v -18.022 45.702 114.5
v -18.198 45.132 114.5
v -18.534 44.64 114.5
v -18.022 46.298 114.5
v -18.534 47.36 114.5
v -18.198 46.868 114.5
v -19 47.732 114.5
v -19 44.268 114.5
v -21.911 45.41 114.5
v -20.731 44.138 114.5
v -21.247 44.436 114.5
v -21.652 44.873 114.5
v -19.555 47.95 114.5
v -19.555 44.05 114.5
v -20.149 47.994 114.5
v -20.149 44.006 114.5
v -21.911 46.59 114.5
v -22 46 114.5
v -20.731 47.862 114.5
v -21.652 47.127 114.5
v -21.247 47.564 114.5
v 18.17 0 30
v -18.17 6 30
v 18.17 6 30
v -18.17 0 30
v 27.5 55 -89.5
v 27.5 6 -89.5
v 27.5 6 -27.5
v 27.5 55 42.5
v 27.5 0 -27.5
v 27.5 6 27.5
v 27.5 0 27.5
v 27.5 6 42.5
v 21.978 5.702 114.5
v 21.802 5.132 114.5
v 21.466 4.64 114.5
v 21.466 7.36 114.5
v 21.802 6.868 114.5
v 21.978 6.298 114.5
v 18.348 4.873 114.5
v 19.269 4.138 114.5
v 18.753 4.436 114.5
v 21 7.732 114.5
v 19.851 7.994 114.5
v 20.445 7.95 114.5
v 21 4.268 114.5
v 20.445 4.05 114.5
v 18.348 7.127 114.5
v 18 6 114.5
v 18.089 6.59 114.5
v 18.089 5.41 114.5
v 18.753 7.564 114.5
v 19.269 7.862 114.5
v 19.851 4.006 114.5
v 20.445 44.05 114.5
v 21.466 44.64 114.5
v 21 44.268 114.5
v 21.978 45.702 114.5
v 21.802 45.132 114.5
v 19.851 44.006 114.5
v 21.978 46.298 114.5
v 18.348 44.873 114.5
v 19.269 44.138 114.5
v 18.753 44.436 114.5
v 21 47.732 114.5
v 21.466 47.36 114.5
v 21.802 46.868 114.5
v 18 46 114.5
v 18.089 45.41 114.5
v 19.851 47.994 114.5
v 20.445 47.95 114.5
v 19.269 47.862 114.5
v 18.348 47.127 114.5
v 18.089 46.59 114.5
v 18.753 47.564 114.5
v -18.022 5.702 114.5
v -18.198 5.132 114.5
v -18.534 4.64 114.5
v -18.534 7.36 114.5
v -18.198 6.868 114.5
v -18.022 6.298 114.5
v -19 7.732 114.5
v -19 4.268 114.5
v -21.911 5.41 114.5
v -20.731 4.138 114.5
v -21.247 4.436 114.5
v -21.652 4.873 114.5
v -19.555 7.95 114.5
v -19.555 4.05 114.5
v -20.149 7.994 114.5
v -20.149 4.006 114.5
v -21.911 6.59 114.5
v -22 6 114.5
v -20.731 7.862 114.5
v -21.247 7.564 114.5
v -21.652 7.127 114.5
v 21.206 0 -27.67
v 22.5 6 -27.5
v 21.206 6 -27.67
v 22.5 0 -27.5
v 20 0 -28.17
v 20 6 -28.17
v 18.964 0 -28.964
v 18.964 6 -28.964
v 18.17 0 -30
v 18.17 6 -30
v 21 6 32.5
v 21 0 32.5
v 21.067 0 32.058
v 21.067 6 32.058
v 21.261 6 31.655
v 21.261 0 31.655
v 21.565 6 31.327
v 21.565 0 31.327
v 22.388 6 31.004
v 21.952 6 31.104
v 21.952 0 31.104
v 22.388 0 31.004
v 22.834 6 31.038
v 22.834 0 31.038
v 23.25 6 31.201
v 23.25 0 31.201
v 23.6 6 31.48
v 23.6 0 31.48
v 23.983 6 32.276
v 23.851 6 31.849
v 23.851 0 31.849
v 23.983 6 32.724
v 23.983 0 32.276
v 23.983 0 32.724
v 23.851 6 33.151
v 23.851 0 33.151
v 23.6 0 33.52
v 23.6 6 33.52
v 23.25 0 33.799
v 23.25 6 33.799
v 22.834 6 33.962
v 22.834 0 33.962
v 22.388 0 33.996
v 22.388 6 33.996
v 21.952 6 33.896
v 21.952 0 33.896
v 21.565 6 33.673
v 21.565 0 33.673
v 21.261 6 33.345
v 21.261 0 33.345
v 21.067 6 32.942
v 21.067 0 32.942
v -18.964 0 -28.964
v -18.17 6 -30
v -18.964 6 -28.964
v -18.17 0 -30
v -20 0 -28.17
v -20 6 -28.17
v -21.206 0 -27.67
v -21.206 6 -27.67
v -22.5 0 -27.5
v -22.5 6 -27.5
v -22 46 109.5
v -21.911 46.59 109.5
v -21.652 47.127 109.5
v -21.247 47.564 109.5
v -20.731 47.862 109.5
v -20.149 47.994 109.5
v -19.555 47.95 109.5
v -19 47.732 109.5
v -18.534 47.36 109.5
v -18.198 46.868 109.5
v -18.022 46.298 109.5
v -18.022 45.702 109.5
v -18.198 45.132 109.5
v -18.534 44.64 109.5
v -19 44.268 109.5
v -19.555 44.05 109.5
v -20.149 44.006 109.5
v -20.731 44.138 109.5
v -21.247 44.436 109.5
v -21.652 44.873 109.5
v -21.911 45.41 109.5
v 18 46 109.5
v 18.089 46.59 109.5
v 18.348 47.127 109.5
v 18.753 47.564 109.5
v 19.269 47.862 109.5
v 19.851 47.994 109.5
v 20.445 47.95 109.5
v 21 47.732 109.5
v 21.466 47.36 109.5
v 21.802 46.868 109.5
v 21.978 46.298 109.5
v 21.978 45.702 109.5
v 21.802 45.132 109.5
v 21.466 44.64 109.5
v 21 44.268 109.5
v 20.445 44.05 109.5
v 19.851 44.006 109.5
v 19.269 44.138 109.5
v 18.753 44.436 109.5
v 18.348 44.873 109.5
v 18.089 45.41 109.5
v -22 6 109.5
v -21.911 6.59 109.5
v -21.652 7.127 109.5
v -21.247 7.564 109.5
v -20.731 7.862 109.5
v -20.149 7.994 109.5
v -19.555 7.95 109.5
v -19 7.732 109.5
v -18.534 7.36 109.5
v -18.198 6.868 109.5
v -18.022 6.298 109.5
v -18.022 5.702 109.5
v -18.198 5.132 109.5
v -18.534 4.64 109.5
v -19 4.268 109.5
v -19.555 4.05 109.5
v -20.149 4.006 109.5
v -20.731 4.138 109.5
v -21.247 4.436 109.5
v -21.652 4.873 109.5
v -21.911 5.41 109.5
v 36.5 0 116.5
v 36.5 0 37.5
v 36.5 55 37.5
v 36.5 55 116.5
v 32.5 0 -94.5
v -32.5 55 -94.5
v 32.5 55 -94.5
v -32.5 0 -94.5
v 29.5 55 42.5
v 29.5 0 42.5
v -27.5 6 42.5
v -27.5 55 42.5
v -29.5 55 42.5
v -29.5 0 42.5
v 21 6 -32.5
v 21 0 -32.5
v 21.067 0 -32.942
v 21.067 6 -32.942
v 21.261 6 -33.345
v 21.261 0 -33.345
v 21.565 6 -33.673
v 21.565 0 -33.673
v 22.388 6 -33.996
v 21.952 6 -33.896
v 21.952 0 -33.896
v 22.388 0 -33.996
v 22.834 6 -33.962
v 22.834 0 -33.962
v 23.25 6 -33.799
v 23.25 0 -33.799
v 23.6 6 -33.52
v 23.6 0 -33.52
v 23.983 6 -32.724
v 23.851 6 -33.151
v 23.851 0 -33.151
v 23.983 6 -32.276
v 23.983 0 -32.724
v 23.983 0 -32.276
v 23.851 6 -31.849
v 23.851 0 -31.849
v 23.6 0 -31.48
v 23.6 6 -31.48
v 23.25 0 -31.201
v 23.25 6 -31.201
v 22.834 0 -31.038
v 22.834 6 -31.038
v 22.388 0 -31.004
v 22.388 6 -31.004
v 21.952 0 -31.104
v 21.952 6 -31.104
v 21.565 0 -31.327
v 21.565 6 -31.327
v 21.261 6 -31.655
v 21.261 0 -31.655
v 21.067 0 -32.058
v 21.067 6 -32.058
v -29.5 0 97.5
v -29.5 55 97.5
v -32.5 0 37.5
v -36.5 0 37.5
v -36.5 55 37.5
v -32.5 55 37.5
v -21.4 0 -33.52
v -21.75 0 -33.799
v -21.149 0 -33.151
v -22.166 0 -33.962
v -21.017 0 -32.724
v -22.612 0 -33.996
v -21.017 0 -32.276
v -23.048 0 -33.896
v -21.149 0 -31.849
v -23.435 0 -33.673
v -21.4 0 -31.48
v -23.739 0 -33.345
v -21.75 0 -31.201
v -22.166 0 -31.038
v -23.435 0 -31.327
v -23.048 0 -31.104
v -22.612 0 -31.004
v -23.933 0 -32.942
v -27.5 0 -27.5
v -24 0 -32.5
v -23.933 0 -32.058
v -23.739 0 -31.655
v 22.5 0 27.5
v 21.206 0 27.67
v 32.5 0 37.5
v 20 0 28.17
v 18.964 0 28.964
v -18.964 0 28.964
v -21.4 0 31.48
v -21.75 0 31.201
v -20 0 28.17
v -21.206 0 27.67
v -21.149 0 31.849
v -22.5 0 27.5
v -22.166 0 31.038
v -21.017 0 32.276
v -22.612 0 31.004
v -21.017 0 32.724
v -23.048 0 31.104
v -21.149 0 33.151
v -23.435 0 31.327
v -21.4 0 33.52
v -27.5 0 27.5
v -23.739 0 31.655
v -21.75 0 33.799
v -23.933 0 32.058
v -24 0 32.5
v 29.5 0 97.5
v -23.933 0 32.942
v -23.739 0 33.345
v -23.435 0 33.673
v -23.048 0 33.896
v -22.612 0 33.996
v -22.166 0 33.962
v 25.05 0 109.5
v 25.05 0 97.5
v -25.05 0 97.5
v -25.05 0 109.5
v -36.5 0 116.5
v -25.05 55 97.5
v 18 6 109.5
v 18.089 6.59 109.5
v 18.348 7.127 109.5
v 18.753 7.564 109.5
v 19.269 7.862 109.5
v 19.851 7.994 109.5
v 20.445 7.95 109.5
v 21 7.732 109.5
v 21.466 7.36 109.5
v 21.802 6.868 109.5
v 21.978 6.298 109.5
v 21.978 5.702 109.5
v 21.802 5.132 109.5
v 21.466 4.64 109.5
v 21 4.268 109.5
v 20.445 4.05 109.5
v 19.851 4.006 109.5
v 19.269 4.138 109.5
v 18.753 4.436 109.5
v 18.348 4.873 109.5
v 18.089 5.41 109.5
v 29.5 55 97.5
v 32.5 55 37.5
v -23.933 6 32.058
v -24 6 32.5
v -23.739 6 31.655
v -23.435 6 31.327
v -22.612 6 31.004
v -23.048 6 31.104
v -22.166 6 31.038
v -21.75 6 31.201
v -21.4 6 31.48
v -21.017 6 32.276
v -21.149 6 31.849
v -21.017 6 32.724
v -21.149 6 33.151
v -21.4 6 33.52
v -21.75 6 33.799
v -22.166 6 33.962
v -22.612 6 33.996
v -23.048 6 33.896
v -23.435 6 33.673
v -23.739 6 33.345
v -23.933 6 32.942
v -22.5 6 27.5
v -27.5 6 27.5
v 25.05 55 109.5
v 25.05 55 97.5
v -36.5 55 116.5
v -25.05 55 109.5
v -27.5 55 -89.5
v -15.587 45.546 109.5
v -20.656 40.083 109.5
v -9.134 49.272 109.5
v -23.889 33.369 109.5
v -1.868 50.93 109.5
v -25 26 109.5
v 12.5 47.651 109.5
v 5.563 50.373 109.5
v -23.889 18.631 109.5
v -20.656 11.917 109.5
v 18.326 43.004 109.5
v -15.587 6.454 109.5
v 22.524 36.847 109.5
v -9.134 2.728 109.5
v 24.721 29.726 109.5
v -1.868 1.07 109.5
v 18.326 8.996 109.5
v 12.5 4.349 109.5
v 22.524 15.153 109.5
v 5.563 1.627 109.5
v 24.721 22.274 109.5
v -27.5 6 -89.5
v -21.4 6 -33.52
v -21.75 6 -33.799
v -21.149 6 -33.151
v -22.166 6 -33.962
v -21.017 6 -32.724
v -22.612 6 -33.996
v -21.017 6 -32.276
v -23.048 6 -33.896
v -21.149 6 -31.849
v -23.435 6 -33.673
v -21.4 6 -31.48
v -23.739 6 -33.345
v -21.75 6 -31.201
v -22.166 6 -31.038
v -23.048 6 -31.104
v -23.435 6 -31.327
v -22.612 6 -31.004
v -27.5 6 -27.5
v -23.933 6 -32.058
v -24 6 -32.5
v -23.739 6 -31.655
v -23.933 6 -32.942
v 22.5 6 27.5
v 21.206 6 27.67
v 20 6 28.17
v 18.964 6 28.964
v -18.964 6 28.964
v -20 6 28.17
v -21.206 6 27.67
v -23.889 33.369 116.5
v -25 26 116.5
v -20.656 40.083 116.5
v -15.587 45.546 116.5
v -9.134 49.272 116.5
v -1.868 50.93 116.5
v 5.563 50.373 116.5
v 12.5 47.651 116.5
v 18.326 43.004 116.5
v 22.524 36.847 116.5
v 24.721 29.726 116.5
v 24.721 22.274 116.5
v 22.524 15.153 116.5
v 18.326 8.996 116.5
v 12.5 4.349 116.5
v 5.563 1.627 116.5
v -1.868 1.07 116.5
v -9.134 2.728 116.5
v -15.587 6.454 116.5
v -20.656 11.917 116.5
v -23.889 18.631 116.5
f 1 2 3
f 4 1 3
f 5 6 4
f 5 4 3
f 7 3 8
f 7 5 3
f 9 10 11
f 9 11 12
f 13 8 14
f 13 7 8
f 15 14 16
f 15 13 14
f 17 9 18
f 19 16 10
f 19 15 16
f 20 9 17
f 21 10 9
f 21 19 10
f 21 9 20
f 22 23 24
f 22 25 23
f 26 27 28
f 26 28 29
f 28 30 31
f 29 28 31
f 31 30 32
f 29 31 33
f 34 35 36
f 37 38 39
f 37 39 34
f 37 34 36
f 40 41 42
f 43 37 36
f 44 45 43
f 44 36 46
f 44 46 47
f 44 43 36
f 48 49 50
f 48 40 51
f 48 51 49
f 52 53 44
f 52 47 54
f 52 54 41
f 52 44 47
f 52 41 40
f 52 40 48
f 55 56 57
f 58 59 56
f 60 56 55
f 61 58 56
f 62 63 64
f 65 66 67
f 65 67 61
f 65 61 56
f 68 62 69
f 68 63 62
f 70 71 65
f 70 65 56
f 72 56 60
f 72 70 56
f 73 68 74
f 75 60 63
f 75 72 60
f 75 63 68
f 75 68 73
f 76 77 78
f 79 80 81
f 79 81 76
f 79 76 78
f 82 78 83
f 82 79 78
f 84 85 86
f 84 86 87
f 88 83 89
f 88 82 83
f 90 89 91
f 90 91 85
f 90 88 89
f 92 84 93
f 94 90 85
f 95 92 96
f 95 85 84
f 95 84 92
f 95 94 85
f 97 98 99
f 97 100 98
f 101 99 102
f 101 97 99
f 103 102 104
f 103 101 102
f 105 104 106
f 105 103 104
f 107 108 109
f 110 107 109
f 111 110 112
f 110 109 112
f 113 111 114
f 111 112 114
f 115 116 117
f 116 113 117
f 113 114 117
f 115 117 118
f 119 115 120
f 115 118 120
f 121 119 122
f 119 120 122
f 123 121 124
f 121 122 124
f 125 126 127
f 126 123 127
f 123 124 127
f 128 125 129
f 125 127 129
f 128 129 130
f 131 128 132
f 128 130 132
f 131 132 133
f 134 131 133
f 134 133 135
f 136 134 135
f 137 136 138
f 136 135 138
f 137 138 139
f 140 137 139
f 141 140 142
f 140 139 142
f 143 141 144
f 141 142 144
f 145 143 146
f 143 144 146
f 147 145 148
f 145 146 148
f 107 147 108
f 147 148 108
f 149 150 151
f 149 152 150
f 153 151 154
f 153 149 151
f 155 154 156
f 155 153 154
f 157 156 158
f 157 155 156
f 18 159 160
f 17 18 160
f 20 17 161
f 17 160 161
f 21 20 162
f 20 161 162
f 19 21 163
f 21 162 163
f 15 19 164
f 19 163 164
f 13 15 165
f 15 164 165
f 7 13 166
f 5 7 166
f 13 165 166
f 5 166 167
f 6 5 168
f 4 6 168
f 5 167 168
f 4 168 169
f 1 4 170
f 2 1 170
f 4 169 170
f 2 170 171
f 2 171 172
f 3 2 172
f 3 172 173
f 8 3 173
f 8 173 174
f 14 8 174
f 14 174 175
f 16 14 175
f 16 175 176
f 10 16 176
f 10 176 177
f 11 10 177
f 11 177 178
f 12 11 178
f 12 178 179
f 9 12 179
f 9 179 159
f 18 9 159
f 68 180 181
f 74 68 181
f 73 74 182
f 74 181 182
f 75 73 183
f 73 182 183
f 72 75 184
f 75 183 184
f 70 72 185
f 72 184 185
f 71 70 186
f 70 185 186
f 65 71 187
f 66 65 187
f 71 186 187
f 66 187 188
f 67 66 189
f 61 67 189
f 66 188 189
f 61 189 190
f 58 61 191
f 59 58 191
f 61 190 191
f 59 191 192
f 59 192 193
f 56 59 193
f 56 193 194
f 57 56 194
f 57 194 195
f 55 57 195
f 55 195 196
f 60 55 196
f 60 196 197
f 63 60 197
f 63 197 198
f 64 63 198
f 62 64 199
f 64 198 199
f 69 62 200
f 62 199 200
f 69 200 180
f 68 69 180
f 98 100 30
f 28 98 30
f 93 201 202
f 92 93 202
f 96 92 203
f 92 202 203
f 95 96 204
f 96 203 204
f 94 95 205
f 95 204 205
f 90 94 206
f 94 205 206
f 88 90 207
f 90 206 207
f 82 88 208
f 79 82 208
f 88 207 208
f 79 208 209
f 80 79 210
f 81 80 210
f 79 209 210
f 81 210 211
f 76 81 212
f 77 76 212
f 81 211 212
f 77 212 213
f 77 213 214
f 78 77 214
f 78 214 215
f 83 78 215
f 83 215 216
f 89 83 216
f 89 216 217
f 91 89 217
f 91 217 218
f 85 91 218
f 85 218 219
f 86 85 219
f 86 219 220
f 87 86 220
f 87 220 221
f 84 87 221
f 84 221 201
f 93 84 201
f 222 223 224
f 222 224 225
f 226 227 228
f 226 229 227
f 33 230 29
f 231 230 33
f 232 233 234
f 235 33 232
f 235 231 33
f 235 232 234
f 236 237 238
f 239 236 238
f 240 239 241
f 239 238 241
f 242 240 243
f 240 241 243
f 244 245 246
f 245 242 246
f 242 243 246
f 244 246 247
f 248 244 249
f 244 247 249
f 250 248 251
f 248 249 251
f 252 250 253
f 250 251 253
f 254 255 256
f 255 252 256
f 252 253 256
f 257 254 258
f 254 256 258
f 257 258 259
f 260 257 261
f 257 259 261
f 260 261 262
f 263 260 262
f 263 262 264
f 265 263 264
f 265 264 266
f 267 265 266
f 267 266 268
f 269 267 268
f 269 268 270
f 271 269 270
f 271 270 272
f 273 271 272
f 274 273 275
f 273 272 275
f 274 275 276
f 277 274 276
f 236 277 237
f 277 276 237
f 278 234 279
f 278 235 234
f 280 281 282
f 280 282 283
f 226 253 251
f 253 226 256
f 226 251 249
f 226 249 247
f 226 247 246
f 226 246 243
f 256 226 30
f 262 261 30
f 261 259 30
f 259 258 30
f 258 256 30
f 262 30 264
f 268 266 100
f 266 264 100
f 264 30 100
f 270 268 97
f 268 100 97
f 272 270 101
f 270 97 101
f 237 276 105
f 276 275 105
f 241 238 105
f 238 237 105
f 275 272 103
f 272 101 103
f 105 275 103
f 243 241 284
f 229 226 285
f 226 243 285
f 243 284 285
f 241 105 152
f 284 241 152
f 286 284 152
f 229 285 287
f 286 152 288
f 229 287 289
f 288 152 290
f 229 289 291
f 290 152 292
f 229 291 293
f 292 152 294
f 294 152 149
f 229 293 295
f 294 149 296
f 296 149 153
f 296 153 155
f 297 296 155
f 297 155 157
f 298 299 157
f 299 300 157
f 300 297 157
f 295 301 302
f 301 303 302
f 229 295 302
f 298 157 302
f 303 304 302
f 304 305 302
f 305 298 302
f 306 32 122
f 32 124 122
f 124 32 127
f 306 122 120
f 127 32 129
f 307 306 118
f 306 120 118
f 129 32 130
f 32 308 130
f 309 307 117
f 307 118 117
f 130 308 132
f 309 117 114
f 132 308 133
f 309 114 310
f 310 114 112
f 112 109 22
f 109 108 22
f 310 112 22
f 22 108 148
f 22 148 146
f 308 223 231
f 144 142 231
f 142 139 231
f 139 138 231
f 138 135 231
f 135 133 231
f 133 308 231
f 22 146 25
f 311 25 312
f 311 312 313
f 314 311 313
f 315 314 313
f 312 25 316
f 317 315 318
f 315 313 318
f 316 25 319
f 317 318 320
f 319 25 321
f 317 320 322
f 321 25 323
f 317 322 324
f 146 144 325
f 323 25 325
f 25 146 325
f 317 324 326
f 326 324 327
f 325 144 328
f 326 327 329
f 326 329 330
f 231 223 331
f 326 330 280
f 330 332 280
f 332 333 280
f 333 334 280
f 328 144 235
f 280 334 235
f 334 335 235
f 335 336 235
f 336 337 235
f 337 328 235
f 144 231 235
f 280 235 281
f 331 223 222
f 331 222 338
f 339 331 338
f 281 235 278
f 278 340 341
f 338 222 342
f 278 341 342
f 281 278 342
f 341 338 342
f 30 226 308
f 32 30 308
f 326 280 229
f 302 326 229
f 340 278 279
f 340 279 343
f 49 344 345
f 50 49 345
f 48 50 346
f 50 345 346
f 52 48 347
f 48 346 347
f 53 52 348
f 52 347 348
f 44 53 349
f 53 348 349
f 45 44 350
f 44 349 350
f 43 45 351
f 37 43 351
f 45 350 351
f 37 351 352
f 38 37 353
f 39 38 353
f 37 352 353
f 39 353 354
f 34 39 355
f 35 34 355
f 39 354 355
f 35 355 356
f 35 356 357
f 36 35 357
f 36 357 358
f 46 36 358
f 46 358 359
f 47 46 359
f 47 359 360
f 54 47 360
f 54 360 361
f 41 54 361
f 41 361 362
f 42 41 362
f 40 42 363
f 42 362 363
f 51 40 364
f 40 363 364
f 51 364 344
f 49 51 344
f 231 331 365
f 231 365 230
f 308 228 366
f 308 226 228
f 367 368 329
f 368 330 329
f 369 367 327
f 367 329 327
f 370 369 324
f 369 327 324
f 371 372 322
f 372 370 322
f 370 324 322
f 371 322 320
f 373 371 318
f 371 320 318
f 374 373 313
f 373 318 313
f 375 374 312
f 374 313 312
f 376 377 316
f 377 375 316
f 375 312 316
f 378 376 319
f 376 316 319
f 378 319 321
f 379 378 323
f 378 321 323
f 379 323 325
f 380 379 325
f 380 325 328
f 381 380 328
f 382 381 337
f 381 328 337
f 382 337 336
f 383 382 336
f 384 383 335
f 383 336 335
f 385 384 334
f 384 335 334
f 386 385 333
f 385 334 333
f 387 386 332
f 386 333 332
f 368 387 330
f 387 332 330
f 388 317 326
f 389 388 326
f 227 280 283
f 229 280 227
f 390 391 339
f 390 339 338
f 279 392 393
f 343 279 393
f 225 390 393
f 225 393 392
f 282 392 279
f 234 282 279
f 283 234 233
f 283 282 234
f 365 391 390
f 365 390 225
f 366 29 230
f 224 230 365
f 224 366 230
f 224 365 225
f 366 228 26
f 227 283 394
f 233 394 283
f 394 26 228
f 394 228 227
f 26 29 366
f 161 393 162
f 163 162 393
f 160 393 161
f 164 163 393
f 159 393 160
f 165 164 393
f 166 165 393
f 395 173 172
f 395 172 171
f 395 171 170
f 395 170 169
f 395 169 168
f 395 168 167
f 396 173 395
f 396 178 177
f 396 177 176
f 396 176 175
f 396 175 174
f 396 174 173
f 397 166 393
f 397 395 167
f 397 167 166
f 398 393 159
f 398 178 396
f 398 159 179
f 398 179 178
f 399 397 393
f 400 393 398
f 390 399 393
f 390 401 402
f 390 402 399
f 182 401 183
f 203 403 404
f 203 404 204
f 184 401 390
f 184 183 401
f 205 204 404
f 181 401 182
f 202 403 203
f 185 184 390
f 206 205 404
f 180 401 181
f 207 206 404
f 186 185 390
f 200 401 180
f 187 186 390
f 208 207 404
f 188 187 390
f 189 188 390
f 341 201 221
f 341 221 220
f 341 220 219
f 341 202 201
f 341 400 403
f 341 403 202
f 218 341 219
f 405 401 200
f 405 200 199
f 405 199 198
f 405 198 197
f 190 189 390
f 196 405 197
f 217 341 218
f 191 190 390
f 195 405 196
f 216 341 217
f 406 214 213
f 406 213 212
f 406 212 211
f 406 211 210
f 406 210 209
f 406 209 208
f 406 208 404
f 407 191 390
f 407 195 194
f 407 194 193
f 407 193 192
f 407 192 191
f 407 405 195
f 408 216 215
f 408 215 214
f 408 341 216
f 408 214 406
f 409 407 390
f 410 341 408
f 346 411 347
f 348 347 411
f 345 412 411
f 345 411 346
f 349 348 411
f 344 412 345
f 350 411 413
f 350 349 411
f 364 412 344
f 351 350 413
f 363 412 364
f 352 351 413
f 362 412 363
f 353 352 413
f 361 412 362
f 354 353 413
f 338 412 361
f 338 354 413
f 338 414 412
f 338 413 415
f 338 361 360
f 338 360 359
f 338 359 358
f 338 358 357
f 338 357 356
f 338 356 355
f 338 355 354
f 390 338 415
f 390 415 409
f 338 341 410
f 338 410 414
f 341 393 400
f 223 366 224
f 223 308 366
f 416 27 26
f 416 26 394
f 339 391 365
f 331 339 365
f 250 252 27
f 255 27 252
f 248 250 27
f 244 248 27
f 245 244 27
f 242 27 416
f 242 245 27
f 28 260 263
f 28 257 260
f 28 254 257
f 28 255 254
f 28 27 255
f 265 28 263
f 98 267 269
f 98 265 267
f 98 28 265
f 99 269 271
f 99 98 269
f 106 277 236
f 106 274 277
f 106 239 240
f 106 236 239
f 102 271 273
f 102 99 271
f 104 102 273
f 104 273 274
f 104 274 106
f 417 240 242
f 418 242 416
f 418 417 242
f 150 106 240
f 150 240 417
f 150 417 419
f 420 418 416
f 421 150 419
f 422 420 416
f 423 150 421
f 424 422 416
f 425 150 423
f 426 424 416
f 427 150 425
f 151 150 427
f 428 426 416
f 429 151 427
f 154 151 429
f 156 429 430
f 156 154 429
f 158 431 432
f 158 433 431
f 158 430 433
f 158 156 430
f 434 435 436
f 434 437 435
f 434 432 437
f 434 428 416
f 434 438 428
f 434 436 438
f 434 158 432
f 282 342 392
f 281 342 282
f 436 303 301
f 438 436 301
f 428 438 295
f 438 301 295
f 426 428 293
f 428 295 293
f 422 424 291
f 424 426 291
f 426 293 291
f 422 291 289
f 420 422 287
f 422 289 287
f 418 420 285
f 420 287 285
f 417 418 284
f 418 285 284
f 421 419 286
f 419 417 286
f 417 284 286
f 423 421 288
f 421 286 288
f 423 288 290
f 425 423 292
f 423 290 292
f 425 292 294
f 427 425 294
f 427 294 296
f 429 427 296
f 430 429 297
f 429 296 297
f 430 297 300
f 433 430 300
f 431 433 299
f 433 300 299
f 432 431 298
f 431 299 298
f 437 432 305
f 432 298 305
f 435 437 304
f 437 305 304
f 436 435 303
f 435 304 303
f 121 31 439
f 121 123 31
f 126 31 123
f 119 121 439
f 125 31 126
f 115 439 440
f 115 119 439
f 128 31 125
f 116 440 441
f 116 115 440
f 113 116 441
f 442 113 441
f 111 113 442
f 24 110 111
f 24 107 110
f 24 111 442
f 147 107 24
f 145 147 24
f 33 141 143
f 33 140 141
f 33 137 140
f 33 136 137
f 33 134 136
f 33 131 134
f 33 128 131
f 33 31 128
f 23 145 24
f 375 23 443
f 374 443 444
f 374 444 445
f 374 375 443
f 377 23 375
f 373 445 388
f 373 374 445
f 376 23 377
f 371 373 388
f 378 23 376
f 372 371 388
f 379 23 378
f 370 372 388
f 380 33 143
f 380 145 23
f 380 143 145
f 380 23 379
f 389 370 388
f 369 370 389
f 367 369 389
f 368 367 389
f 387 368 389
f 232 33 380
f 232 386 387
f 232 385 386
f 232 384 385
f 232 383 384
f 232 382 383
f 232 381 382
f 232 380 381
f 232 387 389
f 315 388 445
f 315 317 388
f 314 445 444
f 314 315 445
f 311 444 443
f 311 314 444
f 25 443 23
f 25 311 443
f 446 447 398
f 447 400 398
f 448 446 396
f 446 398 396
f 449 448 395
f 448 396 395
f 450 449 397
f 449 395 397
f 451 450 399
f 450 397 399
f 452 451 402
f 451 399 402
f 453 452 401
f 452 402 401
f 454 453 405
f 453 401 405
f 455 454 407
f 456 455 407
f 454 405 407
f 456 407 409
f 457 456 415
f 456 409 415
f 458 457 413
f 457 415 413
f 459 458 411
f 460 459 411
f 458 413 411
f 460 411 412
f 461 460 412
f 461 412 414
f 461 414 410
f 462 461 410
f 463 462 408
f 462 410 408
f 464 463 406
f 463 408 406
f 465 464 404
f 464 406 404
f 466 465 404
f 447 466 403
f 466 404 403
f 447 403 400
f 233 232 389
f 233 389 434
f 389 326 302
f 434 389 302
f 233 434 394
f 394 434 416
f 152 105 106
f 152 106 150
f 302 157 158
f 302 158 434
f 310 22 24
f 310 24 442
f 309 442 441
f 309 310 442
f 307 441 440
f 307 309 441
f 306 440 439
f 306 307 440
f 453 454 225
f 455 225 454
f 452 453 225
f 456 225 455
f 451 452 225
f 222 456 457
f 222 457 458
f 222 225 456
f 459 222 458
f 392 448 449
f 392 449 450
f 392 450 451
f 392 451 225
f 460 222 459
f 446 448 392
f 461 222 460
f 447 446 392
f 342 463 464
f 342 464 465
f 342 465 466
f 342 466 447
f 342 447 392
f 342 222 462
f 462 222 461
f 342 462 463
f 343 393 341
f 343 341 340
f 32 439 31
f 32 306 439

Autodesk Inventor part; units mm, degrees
ref_plane "YZ Plane" through (0, 0, 0) normal (1, 0, 0) x (0, 1, 0)
ref_plane "XZ Plane" through (0, 0, 0) normal (0, 1, 0) x (-1, 0, 0)
ref_plane "XY Plane" through (0, 0, 0) normal (0, 0, 1) x (1, 0, 0)
sketch "Sketch1" plane through (0, 0, 0) normal (0, 1, 0) x (-1, 0, 0)
  line L0 (-22.5, 32.5) -> (22.5, 32.5) construction
  line L1 (22.5, 32.5) -> (22.5, -32.5) construction
  line L2 (22.5, -32.5) -> (-22.5, -32.5) construction
  line L3 (-22.5, -32.5) -> (-22.5, 32.5) construction
  line L4 (-22.5, 32.5) -> (22.5, -32.5) construction
  line L5 (22.5, 32.5) -> (-22.5, -32.5) construction
  circle A0 centre (22.5, 32.5) radius 1.5
  circle A1 centre (22.5, -32.5) radius 1.5
  circle A2 centre (-22.5, -32.5) radius 1.5
  circle A3 centre (-22.5, 32.5) radius 1.5
  line L6 (27.5, 30) -> (-27.5, 30)
  line L7 (-27.5, 30) -> (-27.5, 37.5)
  line L8 (-27.5, 37.5) -> (27.5, 37.5)
  line L9 (27.5, 37.5) -> (27.5, 30)
  line L10 (27.5, -30) -> (27.5, -37.5)
  line L11 (27.5, -37.5) -> (-27.5, -37.5)
  line L12 (-27.5, -37.5) -> (-27.5, -30)
  line L13 (-27.5, -30) -> (27.5, -30)
  circle A4 centre (22.5, 32.5) radius 5
  circle A5 centre (22.5, -32.5) radius 5
  circle A6 centre (-22.5, -32.5) radius 5
  circle A7 centre (-22.5, 32.5) radius 5
  line L14 (-27.5, 37.5) -> (27.5, 37.5)
  line L15 (27.5, 37.5) -> (27.5, -37.5)
  line L16 (27.5, -37.5) -> (-27.5, -37.5)
  line L17 (-27.5, -37.5) -> (-27.5, 37.5)
  line L18 (-27.5, 37.5) -> (27.5, -37.5) construction
  line L19 (27.5, 37.5) -> (-27.5, -37.5) construction
  line L20 (-32.5, 42.5) -> (32.5, 42.5)
  line L21 (32.5, 42.5) -> (32.5, -42.5)
  line L22 (32.5, -42.5) -> (-32.5, -42.5)
  line L23 (-32.5, -42.5) -> (-32.5, 42.5)
  line L24 (-32.5, 42.5) -> (32.5, -42.5) construction
  line L25 (32.5, 42.5) -> (-32.5, -42.5) construction
  line L26 (32.5, 42.5) -> (-14.872, 42.5)
  line L27 (0, 0) -> (0, -184) construction
  line L28 (-21, -47.5) -> (21, -47.5)
  line L29 (21, -47.5) -> (21, -89.5)
  line L30 (21, -89.5) -> (-21, -89.5)
  line L31 (-21, -89.5) -> (-21, -47.5)
  line L32 (-21, -47.5) -> (21, -89.5) construction
  line L33 (21, -47.5) -> (-21, -89.5) construction
  line L34 (32.5, -42.5) -> (32.5, -94.5)
  line L35 (32.5, -94.5) -> (-32.5, -94.5)
  line L36 (-32.5, -94.5) -> (-32.5, -42.5)
  line L37 (22.5, 27.5) -> (27.5, 27.5)
  line L38 (22.5, -27.5) -> (27.5, -27.5)
  line L39 (-22.5, -27.5) -> (-27.5, -27.5)
  line L40 (-22.5, 27.5) -> (-27.5, 27.5)
  line L41 (0, 0) -> (0, 113) construction
  line L42 (32.5, 42.5) -> (32.5, 97.5)
  line L43 (32.5, 97.5) -> (-32.5, 97.5)
  line L44 (-32.5, 97.5) -> (-32.5, 42.5)
  line L45 (29.5, 42.5) -> (29.5, 97.5)
  line L46 (-29.5, 97.5) -> (-29.5, 42.5)
  line L47 (32.5, 42.5) -> (36.5, 42.5)
  line L48 (36.5, 42.5) -> (36.5, 112.5)
  line L49 (36.5, 112.5) -> (-36.5, 112.5)
  line L50 (-36.5, 112.5) -> (-36.5, 42.5)
  line L51 (-36.5, 42.5) -> (-32.5, 42.5)
  line L52 (-27.5, 37.5) -> (-36.5, 37.5)
  line L53 (-36.5, 37.5) -> (-36.5, 42.5)
  line L54 (-27.5, -27.5) -> (-26.5, -27.5)
  line L55 (-26.5, -27.5) -> (-26.5, 27.5)
  line L56 (0, 112.5) -> (0, 97.5)
  line L57 (-25.05, 112.5) -> (25.05, 112.5)
  line L58 (25.05, 112.5) -> (25.05, 97.5)
  line L59 (25.05, 97.5) -> (-25.05, 97.5)
  line L60 (-25.05, 97.5) -> (-25.05, 112.5)
  line L61 (-25.05, 112.5) -> (25.05, 97.5) construction
  line L62 (25.05, 112.5) -> (-25.05, 97.5) construction
  line L63 (25.05, 109.5) -> (-25.05, 109.5)
  line L64 (36.5, 112.5) -> (-36.5, 112.5)
  line L65 (-36.5, 112.5) -> (-36.5, 116.5)
  line L66 (-36.5, 116.5) -> (36.5, 116.5)
  line L67 (36.5, 116.5) -> (36.5, 112.5)
  line L68 (36.5, 42.5) -> (36.5, 37.5)
  line L69 (36.5, 37.5) -> (32.5, 37.5)
  point P0 (0, -68.5)
  point P1 (18.1699, 30)
  point P2 (18.1699, -30)
  point P3 (-18.1699, -30)
  point P4 (-18.1699, 30)
  point P5 (-32.5, 70)
  point P6 (32.5, 0)
  point P7 (-32.5, 37.5)
  point P8 (0, 105)
  point P9 (-25.05, 97.5)
  dimension "d8" = 10
  dimension "d9" = 10
  dimension "d10" = 10
  dimension "d11" = 10
  dimension "d0" = 45
  dimension "d1" = 65
  dimension "d2" = 3
  dimension "d3" = 3
  dimension "d4" = 3
  dimension "d5" = 3
  dimension "d6" = 2.5
  dimension "d7" = 2.5
  dimension "d12" = 5
  dimension "d13" = 5
  dimension "d17" = 42
  dimension "d18" = 42
  dimension "d19" = 5
  dimension "d20" = 5
  dimension "d38" = 55
  dimension "d39" = 3
  dimension "d40" = 3
  dimension "d41" = 4
  dimension "d42" = 4
  dimension "d43" = 15
  dimension "d57" = 1
  dimension "d72" = 50.1
  dimension "d84" = 7
  dimension "d85" = 3
extrude "Extrusion1" add sketch "Sketch1" along normal blind 6 contours L15 L37 A4 L6 | L6 A4 L9 | L23 L20 L21 L22 | L52 L53 L51 L23 | A4 L6 | L6 A4 | A4 L8 L9 | L6 A7 L8 A4 | L15 L13 A5 L38 | A7 L6 | L6 A7 | A7 L7 L8 | L10 A5 L13 | A5 L13 | A7 L40 L17 L6 | L6 L7 A7 | A5 L13 | L10 L11 A5 | A5 L11 A6 L13 | A6 L13 | L13 A6 | L39 A6 L13 L17 | L22 L34 L35 L36 | L44 L43 L46 L20 | L51 L50 L49 L60 L43 L44 | L11 L12 A6 | A6 L12 L13 | L21 L47 L68 L69 | L65 L66 L67 L49 | L20 L45 L43 L42 | L42 L43 L58 L49 L48 L47 | L49 L56 L63 L60 | L49 L58 L63 L56 | L28 L29 L30 L31
sketch "Sketch3" plane through (0, 6, 0) normal (0, 1, 0) x (1, 0, 0)
  line L0 (-29.5, -97.5) -> (-29.5, -42.5) projected
  line L1 (-29.5, -42.5) -> (29.5, -42.5) projected
  circle A0 centre (-22.5, -32.5) radius 1.5 projected
  circle A1 centre (22.5, 32.5) radius 1.5 projected
  circle A2 centre (22.5, -32.5) radius 1.5 projected
  circle A3 centre (-22.5, 32.5) radius 1.5 projected
  arc A4 (-18.1699, -30) -> (-22.5, -27.5) centre (-22.5, -32.5) ccw projected
  line L2 (-22.5, -27.5) -> (-27.5, -27.5) projected
  line L3 (-27.5, -27.5) -> (-27.5, 27.5) projected
  line L4 (-27.5, 27.5) -> (-22.5, 27.5) projected
  arc A5 (-22.5, 27.5) -> (-18.1699, 30) centre (-22.5, 32.5) ccw projected
  line L5 (-18.1699, 30) -> (18.1699, 30) projected
  arc A6 (18.1699, 30) -> (22.5, 27.5) centre (22.5, 32.5) ccw projected
  line L6 (22.5, 27.5) -> (27.5, 27.5) projected
  line L7 (27.5, 27.5) -> (27.5, -27.5) projected
  line L8 (27.5, -27.5) -> (22.5, -27.5) projected
  arc A7 (22.5, -27.5) -> (18.1699, -30) centre (22.5, -32.5) ccw projected
  line L9 (18.1699, -30) -> (-18.1699, -30) projected
  line L10 (32.5, -37.5) -> (32.5, 94.5) projected
  line L11 (32.5, 94.5) -> (-32.5, 94.5) projected
  line L12 (-32.5, 94.5) -> (-32.5, -37.5) projected
  line L13 (-29.5, -97.5) -> (-32.5, -97.5)
  line L14 (-29.5, -97.5) -> (-29.5, -42.5) projected
  line L15 (-29.5, -42.5) -> (-32.5, -42.5)
  line L16 (-32.5, -42.5) -> (-32.5, -97.5)
  line L17 (29.5, -97.5) -> (32.5, -97.5)
  line L18 (32.5, -97.5) -> (32.5, -42.5)
  line L19 (32.5, -42.5) -> (29.5, -42.5)
  line L20 (-32.5, 0) -> (-27.5, 0)
  line L21 (-27.5, 27.5) -> (-27.5, 94.5)
  line L22 (27.5, 27.5) -> (27.5, 94.5)
  line L23 (32.5, 94.5) -> (-32.5, 94.5) projected
  line L24 (36.5, -37.5) -> (32.5, -37.5) projected
  line L25 (27.5, -27.5) -> (27.5, -42.5)
  line L26 (32.5, -31.5) -> (27.5, -31.5)
  line L27 (32.5, -2.5) -> (27.5, -2.5)
  line L28 (27.5, -31.5) -> (27.5, -2.5)
  line L29 (27.5, -17) -> (32.5, -17) construction
  line L30 (-25.05, -97.5) -> (-29.5, -97.5) projected
  line L31 (-36.5, -116.5) -> (36.5, -116.5) projected
  line L32 (36.5, -116.5) -> (36.5, -37.5) projected
  line L33 (-32.5, -37.5) -> (-36.5, -37.5) projected
  line L34 (-36.5, -37.5) -> (-36.5, -116.5) projected
  line L35 (29.5, -42.5) -> (29.5, -97.5) projected
  line L36 (29.5, -97.5) -> (25.05, -97.5) projected
  line L37 (25.05, -97.5) -> (25.05, -109.5) projected
  line L38 (25.05, -109.5) -> (-25.05, -109.5) projected
  line L39 (-25.05, -109.5) -> (-25.05, -97.5) projected
  line L40 (-27.5, -27.5) -> (-27.5, -42.5)
  line L41 (27.5, 89.5) -> (-27.5, 89.5)
  point P0 (0, 0)
  point P1 (27.5, 0)
  point P2 (30, -2.5)
  point P3 (30, -31.5)
  point P4 (-32.5, -42.5)
  dimension "d44" = 3
  dimension "d45" = 3
  dimension "d48" = 29
  dimension "d49" = 1
  dimension "d107" = 5
extrude "Extrusion3" add sketch "Sketch3" along normal blind 45 contours L13 L16 L15 L0 | L30 L39 L38 L37 L36 L17 L18 L19 L1 L25 L26 L10 L24 L32 L31 L34 L33 L12 L20 L3 L40 L15 L16 L13 | L19 L18 L17 L35 | L25 L7 L27 L10 L26 | L20 L12 L11 L21 L3 | L7 L22 L11 L10 L27 | L21 L11 L22 L41
sketch "Sketch7" plane through (25.05, 0, 109.5) normal (0, 0, -1) x (-1, 0, 0)
  line L0 (4.05, 6) -> (46.05, 6) projected
  line L1 (0, 0) -> (50.1, 0) projected
  line L2 (50.1, 0) -> (50.1, 51) projected
  line L3 (0, 0) -> (0, 51) projected
  line L4 (25.05, 51) -> (25.05, 0) construction
  line L5 (5.05, 46) -> (45.05, 46)
  line L6 (45.05, 46) -> (45.05, 6)
  line L7 (45.05, 6) -> (5.05, 6)
  line L8 (5.05, 6) -> (5.05, 46)
  line L9 (5.05, 46) -> (45.05, 6) construction
  line L10 (45.05, 46) -> (5.05, 6) construction
  circle A0 centre (45.05, 6) radius 2
  circle A1 centre (45.05, 46) radius 2
  circle A2 centre (5.05, 46) radius 2
  circle A3 centre (5.05, 6) radius 2
  circle A4 centre (25.05, 26) radius 25
  line L11 (0, 51) -> (50.1, 51) projected
  dimension "d74" = 40
  dimension "d75" = 40
  dimension "d77" = 4
  dimension "d78" = 4
  dimension "d79" = 4
  dimension "d80" = 4
  dimension "d81" = 50
  dimension "d86" = 6
extrude "Extrusion9" cut sketch "Sketch7" against normal blind 45 contours A4 L8 L5 L6 L0 | L0 A4 | A4 L8 | L6 A4 | A4 L5
extrude "Extrusion10" cut sketch "Sketch7" against normal blind 5 contours L8 A3 L0 | L0 A3 L8 | A0 L6 L0 | L0 L6 A0 | A2 L5 L8 | L8 L5 A2 | A1 L5 L6 | L6 L5 A1
sketch "Sketch8" plane through (0, 51, 0) normal (0, 1, 0) x (1, 0, 0)
  line L0 (32.5, 94.5) -> (-32.5, 94.5) projected
  line L1 (-32.5, 94.5) -> (-32.5, -37.5) projected
  line L2 (-36.5, -116.5) -> (0, -116.5) projected
  line L3 (36.5, -116.5) -> (36.5, -37.5) projected
  line L4 (36.5, -37.5) -> (32.5, -37.5) projected
  line L5 (32.5, -37.5) -> (32.5, 94.5) projected
  line L6 (-36.5, -42.5) -> (36.5, -42.5)
  line L7 (-32.5, -37.5) -> (-36.5, -37.5) projected
  line L8 (-36.5, -37.5) -> (-36.5, -116.5) projected
  line L9 (0, -109.5) -> (0, -116.5) projected
  line L10 (0, -116.5) -> (36.5, -116.5) projected
  line L11 (27.5, -42.5) -> (29.5, -42.5) projected
  line L12 (29.5, -42.5) -> (29.5, -97.5) projected
  line L13 (29.5, -97.5) -> (25.05, -97.5) projected
  line L14 (25.05, -97.5) -> (25.05, -109.5) projected
  line L15 (25.05, -109.5) -> (0, -109.5) projected
  line L16 (0, -109.5) -> (-25.05, -109.5) projected
  line L17 (-25.05, -109.5) -> (-25.05, -97.5) projected
  line L18 (-25.05, -97.5) -> (-29.5, -97.5) projected
  line L19 (-29.5, -97.5) -> (-29.5, -42.5) projected
  line L20 (27.5, 89.5) -> (27.5, -42.5) projected
  line L21 (-29.5, -42.5) -> (-27.5, -42.5) projected
  line L22 (-27.5, -42.5) -> (-27.5, 89.5) projected
  line L23 (-27.5, 89.5) -> (27.5, 89.5) projected
  point P0 (0, 0)
extrude "Extrusion11" add sketch "Sketch8" along normal blind 4 contours L5 L4 L3 L6 L20 L23 L22 L8 L7 L1 L0 | L3 L10 L9 L15 L14 L13 L12 L6 | L6 L19 L18 L17 L16 L9 L2 L8
properties part number "New_base_v2"
